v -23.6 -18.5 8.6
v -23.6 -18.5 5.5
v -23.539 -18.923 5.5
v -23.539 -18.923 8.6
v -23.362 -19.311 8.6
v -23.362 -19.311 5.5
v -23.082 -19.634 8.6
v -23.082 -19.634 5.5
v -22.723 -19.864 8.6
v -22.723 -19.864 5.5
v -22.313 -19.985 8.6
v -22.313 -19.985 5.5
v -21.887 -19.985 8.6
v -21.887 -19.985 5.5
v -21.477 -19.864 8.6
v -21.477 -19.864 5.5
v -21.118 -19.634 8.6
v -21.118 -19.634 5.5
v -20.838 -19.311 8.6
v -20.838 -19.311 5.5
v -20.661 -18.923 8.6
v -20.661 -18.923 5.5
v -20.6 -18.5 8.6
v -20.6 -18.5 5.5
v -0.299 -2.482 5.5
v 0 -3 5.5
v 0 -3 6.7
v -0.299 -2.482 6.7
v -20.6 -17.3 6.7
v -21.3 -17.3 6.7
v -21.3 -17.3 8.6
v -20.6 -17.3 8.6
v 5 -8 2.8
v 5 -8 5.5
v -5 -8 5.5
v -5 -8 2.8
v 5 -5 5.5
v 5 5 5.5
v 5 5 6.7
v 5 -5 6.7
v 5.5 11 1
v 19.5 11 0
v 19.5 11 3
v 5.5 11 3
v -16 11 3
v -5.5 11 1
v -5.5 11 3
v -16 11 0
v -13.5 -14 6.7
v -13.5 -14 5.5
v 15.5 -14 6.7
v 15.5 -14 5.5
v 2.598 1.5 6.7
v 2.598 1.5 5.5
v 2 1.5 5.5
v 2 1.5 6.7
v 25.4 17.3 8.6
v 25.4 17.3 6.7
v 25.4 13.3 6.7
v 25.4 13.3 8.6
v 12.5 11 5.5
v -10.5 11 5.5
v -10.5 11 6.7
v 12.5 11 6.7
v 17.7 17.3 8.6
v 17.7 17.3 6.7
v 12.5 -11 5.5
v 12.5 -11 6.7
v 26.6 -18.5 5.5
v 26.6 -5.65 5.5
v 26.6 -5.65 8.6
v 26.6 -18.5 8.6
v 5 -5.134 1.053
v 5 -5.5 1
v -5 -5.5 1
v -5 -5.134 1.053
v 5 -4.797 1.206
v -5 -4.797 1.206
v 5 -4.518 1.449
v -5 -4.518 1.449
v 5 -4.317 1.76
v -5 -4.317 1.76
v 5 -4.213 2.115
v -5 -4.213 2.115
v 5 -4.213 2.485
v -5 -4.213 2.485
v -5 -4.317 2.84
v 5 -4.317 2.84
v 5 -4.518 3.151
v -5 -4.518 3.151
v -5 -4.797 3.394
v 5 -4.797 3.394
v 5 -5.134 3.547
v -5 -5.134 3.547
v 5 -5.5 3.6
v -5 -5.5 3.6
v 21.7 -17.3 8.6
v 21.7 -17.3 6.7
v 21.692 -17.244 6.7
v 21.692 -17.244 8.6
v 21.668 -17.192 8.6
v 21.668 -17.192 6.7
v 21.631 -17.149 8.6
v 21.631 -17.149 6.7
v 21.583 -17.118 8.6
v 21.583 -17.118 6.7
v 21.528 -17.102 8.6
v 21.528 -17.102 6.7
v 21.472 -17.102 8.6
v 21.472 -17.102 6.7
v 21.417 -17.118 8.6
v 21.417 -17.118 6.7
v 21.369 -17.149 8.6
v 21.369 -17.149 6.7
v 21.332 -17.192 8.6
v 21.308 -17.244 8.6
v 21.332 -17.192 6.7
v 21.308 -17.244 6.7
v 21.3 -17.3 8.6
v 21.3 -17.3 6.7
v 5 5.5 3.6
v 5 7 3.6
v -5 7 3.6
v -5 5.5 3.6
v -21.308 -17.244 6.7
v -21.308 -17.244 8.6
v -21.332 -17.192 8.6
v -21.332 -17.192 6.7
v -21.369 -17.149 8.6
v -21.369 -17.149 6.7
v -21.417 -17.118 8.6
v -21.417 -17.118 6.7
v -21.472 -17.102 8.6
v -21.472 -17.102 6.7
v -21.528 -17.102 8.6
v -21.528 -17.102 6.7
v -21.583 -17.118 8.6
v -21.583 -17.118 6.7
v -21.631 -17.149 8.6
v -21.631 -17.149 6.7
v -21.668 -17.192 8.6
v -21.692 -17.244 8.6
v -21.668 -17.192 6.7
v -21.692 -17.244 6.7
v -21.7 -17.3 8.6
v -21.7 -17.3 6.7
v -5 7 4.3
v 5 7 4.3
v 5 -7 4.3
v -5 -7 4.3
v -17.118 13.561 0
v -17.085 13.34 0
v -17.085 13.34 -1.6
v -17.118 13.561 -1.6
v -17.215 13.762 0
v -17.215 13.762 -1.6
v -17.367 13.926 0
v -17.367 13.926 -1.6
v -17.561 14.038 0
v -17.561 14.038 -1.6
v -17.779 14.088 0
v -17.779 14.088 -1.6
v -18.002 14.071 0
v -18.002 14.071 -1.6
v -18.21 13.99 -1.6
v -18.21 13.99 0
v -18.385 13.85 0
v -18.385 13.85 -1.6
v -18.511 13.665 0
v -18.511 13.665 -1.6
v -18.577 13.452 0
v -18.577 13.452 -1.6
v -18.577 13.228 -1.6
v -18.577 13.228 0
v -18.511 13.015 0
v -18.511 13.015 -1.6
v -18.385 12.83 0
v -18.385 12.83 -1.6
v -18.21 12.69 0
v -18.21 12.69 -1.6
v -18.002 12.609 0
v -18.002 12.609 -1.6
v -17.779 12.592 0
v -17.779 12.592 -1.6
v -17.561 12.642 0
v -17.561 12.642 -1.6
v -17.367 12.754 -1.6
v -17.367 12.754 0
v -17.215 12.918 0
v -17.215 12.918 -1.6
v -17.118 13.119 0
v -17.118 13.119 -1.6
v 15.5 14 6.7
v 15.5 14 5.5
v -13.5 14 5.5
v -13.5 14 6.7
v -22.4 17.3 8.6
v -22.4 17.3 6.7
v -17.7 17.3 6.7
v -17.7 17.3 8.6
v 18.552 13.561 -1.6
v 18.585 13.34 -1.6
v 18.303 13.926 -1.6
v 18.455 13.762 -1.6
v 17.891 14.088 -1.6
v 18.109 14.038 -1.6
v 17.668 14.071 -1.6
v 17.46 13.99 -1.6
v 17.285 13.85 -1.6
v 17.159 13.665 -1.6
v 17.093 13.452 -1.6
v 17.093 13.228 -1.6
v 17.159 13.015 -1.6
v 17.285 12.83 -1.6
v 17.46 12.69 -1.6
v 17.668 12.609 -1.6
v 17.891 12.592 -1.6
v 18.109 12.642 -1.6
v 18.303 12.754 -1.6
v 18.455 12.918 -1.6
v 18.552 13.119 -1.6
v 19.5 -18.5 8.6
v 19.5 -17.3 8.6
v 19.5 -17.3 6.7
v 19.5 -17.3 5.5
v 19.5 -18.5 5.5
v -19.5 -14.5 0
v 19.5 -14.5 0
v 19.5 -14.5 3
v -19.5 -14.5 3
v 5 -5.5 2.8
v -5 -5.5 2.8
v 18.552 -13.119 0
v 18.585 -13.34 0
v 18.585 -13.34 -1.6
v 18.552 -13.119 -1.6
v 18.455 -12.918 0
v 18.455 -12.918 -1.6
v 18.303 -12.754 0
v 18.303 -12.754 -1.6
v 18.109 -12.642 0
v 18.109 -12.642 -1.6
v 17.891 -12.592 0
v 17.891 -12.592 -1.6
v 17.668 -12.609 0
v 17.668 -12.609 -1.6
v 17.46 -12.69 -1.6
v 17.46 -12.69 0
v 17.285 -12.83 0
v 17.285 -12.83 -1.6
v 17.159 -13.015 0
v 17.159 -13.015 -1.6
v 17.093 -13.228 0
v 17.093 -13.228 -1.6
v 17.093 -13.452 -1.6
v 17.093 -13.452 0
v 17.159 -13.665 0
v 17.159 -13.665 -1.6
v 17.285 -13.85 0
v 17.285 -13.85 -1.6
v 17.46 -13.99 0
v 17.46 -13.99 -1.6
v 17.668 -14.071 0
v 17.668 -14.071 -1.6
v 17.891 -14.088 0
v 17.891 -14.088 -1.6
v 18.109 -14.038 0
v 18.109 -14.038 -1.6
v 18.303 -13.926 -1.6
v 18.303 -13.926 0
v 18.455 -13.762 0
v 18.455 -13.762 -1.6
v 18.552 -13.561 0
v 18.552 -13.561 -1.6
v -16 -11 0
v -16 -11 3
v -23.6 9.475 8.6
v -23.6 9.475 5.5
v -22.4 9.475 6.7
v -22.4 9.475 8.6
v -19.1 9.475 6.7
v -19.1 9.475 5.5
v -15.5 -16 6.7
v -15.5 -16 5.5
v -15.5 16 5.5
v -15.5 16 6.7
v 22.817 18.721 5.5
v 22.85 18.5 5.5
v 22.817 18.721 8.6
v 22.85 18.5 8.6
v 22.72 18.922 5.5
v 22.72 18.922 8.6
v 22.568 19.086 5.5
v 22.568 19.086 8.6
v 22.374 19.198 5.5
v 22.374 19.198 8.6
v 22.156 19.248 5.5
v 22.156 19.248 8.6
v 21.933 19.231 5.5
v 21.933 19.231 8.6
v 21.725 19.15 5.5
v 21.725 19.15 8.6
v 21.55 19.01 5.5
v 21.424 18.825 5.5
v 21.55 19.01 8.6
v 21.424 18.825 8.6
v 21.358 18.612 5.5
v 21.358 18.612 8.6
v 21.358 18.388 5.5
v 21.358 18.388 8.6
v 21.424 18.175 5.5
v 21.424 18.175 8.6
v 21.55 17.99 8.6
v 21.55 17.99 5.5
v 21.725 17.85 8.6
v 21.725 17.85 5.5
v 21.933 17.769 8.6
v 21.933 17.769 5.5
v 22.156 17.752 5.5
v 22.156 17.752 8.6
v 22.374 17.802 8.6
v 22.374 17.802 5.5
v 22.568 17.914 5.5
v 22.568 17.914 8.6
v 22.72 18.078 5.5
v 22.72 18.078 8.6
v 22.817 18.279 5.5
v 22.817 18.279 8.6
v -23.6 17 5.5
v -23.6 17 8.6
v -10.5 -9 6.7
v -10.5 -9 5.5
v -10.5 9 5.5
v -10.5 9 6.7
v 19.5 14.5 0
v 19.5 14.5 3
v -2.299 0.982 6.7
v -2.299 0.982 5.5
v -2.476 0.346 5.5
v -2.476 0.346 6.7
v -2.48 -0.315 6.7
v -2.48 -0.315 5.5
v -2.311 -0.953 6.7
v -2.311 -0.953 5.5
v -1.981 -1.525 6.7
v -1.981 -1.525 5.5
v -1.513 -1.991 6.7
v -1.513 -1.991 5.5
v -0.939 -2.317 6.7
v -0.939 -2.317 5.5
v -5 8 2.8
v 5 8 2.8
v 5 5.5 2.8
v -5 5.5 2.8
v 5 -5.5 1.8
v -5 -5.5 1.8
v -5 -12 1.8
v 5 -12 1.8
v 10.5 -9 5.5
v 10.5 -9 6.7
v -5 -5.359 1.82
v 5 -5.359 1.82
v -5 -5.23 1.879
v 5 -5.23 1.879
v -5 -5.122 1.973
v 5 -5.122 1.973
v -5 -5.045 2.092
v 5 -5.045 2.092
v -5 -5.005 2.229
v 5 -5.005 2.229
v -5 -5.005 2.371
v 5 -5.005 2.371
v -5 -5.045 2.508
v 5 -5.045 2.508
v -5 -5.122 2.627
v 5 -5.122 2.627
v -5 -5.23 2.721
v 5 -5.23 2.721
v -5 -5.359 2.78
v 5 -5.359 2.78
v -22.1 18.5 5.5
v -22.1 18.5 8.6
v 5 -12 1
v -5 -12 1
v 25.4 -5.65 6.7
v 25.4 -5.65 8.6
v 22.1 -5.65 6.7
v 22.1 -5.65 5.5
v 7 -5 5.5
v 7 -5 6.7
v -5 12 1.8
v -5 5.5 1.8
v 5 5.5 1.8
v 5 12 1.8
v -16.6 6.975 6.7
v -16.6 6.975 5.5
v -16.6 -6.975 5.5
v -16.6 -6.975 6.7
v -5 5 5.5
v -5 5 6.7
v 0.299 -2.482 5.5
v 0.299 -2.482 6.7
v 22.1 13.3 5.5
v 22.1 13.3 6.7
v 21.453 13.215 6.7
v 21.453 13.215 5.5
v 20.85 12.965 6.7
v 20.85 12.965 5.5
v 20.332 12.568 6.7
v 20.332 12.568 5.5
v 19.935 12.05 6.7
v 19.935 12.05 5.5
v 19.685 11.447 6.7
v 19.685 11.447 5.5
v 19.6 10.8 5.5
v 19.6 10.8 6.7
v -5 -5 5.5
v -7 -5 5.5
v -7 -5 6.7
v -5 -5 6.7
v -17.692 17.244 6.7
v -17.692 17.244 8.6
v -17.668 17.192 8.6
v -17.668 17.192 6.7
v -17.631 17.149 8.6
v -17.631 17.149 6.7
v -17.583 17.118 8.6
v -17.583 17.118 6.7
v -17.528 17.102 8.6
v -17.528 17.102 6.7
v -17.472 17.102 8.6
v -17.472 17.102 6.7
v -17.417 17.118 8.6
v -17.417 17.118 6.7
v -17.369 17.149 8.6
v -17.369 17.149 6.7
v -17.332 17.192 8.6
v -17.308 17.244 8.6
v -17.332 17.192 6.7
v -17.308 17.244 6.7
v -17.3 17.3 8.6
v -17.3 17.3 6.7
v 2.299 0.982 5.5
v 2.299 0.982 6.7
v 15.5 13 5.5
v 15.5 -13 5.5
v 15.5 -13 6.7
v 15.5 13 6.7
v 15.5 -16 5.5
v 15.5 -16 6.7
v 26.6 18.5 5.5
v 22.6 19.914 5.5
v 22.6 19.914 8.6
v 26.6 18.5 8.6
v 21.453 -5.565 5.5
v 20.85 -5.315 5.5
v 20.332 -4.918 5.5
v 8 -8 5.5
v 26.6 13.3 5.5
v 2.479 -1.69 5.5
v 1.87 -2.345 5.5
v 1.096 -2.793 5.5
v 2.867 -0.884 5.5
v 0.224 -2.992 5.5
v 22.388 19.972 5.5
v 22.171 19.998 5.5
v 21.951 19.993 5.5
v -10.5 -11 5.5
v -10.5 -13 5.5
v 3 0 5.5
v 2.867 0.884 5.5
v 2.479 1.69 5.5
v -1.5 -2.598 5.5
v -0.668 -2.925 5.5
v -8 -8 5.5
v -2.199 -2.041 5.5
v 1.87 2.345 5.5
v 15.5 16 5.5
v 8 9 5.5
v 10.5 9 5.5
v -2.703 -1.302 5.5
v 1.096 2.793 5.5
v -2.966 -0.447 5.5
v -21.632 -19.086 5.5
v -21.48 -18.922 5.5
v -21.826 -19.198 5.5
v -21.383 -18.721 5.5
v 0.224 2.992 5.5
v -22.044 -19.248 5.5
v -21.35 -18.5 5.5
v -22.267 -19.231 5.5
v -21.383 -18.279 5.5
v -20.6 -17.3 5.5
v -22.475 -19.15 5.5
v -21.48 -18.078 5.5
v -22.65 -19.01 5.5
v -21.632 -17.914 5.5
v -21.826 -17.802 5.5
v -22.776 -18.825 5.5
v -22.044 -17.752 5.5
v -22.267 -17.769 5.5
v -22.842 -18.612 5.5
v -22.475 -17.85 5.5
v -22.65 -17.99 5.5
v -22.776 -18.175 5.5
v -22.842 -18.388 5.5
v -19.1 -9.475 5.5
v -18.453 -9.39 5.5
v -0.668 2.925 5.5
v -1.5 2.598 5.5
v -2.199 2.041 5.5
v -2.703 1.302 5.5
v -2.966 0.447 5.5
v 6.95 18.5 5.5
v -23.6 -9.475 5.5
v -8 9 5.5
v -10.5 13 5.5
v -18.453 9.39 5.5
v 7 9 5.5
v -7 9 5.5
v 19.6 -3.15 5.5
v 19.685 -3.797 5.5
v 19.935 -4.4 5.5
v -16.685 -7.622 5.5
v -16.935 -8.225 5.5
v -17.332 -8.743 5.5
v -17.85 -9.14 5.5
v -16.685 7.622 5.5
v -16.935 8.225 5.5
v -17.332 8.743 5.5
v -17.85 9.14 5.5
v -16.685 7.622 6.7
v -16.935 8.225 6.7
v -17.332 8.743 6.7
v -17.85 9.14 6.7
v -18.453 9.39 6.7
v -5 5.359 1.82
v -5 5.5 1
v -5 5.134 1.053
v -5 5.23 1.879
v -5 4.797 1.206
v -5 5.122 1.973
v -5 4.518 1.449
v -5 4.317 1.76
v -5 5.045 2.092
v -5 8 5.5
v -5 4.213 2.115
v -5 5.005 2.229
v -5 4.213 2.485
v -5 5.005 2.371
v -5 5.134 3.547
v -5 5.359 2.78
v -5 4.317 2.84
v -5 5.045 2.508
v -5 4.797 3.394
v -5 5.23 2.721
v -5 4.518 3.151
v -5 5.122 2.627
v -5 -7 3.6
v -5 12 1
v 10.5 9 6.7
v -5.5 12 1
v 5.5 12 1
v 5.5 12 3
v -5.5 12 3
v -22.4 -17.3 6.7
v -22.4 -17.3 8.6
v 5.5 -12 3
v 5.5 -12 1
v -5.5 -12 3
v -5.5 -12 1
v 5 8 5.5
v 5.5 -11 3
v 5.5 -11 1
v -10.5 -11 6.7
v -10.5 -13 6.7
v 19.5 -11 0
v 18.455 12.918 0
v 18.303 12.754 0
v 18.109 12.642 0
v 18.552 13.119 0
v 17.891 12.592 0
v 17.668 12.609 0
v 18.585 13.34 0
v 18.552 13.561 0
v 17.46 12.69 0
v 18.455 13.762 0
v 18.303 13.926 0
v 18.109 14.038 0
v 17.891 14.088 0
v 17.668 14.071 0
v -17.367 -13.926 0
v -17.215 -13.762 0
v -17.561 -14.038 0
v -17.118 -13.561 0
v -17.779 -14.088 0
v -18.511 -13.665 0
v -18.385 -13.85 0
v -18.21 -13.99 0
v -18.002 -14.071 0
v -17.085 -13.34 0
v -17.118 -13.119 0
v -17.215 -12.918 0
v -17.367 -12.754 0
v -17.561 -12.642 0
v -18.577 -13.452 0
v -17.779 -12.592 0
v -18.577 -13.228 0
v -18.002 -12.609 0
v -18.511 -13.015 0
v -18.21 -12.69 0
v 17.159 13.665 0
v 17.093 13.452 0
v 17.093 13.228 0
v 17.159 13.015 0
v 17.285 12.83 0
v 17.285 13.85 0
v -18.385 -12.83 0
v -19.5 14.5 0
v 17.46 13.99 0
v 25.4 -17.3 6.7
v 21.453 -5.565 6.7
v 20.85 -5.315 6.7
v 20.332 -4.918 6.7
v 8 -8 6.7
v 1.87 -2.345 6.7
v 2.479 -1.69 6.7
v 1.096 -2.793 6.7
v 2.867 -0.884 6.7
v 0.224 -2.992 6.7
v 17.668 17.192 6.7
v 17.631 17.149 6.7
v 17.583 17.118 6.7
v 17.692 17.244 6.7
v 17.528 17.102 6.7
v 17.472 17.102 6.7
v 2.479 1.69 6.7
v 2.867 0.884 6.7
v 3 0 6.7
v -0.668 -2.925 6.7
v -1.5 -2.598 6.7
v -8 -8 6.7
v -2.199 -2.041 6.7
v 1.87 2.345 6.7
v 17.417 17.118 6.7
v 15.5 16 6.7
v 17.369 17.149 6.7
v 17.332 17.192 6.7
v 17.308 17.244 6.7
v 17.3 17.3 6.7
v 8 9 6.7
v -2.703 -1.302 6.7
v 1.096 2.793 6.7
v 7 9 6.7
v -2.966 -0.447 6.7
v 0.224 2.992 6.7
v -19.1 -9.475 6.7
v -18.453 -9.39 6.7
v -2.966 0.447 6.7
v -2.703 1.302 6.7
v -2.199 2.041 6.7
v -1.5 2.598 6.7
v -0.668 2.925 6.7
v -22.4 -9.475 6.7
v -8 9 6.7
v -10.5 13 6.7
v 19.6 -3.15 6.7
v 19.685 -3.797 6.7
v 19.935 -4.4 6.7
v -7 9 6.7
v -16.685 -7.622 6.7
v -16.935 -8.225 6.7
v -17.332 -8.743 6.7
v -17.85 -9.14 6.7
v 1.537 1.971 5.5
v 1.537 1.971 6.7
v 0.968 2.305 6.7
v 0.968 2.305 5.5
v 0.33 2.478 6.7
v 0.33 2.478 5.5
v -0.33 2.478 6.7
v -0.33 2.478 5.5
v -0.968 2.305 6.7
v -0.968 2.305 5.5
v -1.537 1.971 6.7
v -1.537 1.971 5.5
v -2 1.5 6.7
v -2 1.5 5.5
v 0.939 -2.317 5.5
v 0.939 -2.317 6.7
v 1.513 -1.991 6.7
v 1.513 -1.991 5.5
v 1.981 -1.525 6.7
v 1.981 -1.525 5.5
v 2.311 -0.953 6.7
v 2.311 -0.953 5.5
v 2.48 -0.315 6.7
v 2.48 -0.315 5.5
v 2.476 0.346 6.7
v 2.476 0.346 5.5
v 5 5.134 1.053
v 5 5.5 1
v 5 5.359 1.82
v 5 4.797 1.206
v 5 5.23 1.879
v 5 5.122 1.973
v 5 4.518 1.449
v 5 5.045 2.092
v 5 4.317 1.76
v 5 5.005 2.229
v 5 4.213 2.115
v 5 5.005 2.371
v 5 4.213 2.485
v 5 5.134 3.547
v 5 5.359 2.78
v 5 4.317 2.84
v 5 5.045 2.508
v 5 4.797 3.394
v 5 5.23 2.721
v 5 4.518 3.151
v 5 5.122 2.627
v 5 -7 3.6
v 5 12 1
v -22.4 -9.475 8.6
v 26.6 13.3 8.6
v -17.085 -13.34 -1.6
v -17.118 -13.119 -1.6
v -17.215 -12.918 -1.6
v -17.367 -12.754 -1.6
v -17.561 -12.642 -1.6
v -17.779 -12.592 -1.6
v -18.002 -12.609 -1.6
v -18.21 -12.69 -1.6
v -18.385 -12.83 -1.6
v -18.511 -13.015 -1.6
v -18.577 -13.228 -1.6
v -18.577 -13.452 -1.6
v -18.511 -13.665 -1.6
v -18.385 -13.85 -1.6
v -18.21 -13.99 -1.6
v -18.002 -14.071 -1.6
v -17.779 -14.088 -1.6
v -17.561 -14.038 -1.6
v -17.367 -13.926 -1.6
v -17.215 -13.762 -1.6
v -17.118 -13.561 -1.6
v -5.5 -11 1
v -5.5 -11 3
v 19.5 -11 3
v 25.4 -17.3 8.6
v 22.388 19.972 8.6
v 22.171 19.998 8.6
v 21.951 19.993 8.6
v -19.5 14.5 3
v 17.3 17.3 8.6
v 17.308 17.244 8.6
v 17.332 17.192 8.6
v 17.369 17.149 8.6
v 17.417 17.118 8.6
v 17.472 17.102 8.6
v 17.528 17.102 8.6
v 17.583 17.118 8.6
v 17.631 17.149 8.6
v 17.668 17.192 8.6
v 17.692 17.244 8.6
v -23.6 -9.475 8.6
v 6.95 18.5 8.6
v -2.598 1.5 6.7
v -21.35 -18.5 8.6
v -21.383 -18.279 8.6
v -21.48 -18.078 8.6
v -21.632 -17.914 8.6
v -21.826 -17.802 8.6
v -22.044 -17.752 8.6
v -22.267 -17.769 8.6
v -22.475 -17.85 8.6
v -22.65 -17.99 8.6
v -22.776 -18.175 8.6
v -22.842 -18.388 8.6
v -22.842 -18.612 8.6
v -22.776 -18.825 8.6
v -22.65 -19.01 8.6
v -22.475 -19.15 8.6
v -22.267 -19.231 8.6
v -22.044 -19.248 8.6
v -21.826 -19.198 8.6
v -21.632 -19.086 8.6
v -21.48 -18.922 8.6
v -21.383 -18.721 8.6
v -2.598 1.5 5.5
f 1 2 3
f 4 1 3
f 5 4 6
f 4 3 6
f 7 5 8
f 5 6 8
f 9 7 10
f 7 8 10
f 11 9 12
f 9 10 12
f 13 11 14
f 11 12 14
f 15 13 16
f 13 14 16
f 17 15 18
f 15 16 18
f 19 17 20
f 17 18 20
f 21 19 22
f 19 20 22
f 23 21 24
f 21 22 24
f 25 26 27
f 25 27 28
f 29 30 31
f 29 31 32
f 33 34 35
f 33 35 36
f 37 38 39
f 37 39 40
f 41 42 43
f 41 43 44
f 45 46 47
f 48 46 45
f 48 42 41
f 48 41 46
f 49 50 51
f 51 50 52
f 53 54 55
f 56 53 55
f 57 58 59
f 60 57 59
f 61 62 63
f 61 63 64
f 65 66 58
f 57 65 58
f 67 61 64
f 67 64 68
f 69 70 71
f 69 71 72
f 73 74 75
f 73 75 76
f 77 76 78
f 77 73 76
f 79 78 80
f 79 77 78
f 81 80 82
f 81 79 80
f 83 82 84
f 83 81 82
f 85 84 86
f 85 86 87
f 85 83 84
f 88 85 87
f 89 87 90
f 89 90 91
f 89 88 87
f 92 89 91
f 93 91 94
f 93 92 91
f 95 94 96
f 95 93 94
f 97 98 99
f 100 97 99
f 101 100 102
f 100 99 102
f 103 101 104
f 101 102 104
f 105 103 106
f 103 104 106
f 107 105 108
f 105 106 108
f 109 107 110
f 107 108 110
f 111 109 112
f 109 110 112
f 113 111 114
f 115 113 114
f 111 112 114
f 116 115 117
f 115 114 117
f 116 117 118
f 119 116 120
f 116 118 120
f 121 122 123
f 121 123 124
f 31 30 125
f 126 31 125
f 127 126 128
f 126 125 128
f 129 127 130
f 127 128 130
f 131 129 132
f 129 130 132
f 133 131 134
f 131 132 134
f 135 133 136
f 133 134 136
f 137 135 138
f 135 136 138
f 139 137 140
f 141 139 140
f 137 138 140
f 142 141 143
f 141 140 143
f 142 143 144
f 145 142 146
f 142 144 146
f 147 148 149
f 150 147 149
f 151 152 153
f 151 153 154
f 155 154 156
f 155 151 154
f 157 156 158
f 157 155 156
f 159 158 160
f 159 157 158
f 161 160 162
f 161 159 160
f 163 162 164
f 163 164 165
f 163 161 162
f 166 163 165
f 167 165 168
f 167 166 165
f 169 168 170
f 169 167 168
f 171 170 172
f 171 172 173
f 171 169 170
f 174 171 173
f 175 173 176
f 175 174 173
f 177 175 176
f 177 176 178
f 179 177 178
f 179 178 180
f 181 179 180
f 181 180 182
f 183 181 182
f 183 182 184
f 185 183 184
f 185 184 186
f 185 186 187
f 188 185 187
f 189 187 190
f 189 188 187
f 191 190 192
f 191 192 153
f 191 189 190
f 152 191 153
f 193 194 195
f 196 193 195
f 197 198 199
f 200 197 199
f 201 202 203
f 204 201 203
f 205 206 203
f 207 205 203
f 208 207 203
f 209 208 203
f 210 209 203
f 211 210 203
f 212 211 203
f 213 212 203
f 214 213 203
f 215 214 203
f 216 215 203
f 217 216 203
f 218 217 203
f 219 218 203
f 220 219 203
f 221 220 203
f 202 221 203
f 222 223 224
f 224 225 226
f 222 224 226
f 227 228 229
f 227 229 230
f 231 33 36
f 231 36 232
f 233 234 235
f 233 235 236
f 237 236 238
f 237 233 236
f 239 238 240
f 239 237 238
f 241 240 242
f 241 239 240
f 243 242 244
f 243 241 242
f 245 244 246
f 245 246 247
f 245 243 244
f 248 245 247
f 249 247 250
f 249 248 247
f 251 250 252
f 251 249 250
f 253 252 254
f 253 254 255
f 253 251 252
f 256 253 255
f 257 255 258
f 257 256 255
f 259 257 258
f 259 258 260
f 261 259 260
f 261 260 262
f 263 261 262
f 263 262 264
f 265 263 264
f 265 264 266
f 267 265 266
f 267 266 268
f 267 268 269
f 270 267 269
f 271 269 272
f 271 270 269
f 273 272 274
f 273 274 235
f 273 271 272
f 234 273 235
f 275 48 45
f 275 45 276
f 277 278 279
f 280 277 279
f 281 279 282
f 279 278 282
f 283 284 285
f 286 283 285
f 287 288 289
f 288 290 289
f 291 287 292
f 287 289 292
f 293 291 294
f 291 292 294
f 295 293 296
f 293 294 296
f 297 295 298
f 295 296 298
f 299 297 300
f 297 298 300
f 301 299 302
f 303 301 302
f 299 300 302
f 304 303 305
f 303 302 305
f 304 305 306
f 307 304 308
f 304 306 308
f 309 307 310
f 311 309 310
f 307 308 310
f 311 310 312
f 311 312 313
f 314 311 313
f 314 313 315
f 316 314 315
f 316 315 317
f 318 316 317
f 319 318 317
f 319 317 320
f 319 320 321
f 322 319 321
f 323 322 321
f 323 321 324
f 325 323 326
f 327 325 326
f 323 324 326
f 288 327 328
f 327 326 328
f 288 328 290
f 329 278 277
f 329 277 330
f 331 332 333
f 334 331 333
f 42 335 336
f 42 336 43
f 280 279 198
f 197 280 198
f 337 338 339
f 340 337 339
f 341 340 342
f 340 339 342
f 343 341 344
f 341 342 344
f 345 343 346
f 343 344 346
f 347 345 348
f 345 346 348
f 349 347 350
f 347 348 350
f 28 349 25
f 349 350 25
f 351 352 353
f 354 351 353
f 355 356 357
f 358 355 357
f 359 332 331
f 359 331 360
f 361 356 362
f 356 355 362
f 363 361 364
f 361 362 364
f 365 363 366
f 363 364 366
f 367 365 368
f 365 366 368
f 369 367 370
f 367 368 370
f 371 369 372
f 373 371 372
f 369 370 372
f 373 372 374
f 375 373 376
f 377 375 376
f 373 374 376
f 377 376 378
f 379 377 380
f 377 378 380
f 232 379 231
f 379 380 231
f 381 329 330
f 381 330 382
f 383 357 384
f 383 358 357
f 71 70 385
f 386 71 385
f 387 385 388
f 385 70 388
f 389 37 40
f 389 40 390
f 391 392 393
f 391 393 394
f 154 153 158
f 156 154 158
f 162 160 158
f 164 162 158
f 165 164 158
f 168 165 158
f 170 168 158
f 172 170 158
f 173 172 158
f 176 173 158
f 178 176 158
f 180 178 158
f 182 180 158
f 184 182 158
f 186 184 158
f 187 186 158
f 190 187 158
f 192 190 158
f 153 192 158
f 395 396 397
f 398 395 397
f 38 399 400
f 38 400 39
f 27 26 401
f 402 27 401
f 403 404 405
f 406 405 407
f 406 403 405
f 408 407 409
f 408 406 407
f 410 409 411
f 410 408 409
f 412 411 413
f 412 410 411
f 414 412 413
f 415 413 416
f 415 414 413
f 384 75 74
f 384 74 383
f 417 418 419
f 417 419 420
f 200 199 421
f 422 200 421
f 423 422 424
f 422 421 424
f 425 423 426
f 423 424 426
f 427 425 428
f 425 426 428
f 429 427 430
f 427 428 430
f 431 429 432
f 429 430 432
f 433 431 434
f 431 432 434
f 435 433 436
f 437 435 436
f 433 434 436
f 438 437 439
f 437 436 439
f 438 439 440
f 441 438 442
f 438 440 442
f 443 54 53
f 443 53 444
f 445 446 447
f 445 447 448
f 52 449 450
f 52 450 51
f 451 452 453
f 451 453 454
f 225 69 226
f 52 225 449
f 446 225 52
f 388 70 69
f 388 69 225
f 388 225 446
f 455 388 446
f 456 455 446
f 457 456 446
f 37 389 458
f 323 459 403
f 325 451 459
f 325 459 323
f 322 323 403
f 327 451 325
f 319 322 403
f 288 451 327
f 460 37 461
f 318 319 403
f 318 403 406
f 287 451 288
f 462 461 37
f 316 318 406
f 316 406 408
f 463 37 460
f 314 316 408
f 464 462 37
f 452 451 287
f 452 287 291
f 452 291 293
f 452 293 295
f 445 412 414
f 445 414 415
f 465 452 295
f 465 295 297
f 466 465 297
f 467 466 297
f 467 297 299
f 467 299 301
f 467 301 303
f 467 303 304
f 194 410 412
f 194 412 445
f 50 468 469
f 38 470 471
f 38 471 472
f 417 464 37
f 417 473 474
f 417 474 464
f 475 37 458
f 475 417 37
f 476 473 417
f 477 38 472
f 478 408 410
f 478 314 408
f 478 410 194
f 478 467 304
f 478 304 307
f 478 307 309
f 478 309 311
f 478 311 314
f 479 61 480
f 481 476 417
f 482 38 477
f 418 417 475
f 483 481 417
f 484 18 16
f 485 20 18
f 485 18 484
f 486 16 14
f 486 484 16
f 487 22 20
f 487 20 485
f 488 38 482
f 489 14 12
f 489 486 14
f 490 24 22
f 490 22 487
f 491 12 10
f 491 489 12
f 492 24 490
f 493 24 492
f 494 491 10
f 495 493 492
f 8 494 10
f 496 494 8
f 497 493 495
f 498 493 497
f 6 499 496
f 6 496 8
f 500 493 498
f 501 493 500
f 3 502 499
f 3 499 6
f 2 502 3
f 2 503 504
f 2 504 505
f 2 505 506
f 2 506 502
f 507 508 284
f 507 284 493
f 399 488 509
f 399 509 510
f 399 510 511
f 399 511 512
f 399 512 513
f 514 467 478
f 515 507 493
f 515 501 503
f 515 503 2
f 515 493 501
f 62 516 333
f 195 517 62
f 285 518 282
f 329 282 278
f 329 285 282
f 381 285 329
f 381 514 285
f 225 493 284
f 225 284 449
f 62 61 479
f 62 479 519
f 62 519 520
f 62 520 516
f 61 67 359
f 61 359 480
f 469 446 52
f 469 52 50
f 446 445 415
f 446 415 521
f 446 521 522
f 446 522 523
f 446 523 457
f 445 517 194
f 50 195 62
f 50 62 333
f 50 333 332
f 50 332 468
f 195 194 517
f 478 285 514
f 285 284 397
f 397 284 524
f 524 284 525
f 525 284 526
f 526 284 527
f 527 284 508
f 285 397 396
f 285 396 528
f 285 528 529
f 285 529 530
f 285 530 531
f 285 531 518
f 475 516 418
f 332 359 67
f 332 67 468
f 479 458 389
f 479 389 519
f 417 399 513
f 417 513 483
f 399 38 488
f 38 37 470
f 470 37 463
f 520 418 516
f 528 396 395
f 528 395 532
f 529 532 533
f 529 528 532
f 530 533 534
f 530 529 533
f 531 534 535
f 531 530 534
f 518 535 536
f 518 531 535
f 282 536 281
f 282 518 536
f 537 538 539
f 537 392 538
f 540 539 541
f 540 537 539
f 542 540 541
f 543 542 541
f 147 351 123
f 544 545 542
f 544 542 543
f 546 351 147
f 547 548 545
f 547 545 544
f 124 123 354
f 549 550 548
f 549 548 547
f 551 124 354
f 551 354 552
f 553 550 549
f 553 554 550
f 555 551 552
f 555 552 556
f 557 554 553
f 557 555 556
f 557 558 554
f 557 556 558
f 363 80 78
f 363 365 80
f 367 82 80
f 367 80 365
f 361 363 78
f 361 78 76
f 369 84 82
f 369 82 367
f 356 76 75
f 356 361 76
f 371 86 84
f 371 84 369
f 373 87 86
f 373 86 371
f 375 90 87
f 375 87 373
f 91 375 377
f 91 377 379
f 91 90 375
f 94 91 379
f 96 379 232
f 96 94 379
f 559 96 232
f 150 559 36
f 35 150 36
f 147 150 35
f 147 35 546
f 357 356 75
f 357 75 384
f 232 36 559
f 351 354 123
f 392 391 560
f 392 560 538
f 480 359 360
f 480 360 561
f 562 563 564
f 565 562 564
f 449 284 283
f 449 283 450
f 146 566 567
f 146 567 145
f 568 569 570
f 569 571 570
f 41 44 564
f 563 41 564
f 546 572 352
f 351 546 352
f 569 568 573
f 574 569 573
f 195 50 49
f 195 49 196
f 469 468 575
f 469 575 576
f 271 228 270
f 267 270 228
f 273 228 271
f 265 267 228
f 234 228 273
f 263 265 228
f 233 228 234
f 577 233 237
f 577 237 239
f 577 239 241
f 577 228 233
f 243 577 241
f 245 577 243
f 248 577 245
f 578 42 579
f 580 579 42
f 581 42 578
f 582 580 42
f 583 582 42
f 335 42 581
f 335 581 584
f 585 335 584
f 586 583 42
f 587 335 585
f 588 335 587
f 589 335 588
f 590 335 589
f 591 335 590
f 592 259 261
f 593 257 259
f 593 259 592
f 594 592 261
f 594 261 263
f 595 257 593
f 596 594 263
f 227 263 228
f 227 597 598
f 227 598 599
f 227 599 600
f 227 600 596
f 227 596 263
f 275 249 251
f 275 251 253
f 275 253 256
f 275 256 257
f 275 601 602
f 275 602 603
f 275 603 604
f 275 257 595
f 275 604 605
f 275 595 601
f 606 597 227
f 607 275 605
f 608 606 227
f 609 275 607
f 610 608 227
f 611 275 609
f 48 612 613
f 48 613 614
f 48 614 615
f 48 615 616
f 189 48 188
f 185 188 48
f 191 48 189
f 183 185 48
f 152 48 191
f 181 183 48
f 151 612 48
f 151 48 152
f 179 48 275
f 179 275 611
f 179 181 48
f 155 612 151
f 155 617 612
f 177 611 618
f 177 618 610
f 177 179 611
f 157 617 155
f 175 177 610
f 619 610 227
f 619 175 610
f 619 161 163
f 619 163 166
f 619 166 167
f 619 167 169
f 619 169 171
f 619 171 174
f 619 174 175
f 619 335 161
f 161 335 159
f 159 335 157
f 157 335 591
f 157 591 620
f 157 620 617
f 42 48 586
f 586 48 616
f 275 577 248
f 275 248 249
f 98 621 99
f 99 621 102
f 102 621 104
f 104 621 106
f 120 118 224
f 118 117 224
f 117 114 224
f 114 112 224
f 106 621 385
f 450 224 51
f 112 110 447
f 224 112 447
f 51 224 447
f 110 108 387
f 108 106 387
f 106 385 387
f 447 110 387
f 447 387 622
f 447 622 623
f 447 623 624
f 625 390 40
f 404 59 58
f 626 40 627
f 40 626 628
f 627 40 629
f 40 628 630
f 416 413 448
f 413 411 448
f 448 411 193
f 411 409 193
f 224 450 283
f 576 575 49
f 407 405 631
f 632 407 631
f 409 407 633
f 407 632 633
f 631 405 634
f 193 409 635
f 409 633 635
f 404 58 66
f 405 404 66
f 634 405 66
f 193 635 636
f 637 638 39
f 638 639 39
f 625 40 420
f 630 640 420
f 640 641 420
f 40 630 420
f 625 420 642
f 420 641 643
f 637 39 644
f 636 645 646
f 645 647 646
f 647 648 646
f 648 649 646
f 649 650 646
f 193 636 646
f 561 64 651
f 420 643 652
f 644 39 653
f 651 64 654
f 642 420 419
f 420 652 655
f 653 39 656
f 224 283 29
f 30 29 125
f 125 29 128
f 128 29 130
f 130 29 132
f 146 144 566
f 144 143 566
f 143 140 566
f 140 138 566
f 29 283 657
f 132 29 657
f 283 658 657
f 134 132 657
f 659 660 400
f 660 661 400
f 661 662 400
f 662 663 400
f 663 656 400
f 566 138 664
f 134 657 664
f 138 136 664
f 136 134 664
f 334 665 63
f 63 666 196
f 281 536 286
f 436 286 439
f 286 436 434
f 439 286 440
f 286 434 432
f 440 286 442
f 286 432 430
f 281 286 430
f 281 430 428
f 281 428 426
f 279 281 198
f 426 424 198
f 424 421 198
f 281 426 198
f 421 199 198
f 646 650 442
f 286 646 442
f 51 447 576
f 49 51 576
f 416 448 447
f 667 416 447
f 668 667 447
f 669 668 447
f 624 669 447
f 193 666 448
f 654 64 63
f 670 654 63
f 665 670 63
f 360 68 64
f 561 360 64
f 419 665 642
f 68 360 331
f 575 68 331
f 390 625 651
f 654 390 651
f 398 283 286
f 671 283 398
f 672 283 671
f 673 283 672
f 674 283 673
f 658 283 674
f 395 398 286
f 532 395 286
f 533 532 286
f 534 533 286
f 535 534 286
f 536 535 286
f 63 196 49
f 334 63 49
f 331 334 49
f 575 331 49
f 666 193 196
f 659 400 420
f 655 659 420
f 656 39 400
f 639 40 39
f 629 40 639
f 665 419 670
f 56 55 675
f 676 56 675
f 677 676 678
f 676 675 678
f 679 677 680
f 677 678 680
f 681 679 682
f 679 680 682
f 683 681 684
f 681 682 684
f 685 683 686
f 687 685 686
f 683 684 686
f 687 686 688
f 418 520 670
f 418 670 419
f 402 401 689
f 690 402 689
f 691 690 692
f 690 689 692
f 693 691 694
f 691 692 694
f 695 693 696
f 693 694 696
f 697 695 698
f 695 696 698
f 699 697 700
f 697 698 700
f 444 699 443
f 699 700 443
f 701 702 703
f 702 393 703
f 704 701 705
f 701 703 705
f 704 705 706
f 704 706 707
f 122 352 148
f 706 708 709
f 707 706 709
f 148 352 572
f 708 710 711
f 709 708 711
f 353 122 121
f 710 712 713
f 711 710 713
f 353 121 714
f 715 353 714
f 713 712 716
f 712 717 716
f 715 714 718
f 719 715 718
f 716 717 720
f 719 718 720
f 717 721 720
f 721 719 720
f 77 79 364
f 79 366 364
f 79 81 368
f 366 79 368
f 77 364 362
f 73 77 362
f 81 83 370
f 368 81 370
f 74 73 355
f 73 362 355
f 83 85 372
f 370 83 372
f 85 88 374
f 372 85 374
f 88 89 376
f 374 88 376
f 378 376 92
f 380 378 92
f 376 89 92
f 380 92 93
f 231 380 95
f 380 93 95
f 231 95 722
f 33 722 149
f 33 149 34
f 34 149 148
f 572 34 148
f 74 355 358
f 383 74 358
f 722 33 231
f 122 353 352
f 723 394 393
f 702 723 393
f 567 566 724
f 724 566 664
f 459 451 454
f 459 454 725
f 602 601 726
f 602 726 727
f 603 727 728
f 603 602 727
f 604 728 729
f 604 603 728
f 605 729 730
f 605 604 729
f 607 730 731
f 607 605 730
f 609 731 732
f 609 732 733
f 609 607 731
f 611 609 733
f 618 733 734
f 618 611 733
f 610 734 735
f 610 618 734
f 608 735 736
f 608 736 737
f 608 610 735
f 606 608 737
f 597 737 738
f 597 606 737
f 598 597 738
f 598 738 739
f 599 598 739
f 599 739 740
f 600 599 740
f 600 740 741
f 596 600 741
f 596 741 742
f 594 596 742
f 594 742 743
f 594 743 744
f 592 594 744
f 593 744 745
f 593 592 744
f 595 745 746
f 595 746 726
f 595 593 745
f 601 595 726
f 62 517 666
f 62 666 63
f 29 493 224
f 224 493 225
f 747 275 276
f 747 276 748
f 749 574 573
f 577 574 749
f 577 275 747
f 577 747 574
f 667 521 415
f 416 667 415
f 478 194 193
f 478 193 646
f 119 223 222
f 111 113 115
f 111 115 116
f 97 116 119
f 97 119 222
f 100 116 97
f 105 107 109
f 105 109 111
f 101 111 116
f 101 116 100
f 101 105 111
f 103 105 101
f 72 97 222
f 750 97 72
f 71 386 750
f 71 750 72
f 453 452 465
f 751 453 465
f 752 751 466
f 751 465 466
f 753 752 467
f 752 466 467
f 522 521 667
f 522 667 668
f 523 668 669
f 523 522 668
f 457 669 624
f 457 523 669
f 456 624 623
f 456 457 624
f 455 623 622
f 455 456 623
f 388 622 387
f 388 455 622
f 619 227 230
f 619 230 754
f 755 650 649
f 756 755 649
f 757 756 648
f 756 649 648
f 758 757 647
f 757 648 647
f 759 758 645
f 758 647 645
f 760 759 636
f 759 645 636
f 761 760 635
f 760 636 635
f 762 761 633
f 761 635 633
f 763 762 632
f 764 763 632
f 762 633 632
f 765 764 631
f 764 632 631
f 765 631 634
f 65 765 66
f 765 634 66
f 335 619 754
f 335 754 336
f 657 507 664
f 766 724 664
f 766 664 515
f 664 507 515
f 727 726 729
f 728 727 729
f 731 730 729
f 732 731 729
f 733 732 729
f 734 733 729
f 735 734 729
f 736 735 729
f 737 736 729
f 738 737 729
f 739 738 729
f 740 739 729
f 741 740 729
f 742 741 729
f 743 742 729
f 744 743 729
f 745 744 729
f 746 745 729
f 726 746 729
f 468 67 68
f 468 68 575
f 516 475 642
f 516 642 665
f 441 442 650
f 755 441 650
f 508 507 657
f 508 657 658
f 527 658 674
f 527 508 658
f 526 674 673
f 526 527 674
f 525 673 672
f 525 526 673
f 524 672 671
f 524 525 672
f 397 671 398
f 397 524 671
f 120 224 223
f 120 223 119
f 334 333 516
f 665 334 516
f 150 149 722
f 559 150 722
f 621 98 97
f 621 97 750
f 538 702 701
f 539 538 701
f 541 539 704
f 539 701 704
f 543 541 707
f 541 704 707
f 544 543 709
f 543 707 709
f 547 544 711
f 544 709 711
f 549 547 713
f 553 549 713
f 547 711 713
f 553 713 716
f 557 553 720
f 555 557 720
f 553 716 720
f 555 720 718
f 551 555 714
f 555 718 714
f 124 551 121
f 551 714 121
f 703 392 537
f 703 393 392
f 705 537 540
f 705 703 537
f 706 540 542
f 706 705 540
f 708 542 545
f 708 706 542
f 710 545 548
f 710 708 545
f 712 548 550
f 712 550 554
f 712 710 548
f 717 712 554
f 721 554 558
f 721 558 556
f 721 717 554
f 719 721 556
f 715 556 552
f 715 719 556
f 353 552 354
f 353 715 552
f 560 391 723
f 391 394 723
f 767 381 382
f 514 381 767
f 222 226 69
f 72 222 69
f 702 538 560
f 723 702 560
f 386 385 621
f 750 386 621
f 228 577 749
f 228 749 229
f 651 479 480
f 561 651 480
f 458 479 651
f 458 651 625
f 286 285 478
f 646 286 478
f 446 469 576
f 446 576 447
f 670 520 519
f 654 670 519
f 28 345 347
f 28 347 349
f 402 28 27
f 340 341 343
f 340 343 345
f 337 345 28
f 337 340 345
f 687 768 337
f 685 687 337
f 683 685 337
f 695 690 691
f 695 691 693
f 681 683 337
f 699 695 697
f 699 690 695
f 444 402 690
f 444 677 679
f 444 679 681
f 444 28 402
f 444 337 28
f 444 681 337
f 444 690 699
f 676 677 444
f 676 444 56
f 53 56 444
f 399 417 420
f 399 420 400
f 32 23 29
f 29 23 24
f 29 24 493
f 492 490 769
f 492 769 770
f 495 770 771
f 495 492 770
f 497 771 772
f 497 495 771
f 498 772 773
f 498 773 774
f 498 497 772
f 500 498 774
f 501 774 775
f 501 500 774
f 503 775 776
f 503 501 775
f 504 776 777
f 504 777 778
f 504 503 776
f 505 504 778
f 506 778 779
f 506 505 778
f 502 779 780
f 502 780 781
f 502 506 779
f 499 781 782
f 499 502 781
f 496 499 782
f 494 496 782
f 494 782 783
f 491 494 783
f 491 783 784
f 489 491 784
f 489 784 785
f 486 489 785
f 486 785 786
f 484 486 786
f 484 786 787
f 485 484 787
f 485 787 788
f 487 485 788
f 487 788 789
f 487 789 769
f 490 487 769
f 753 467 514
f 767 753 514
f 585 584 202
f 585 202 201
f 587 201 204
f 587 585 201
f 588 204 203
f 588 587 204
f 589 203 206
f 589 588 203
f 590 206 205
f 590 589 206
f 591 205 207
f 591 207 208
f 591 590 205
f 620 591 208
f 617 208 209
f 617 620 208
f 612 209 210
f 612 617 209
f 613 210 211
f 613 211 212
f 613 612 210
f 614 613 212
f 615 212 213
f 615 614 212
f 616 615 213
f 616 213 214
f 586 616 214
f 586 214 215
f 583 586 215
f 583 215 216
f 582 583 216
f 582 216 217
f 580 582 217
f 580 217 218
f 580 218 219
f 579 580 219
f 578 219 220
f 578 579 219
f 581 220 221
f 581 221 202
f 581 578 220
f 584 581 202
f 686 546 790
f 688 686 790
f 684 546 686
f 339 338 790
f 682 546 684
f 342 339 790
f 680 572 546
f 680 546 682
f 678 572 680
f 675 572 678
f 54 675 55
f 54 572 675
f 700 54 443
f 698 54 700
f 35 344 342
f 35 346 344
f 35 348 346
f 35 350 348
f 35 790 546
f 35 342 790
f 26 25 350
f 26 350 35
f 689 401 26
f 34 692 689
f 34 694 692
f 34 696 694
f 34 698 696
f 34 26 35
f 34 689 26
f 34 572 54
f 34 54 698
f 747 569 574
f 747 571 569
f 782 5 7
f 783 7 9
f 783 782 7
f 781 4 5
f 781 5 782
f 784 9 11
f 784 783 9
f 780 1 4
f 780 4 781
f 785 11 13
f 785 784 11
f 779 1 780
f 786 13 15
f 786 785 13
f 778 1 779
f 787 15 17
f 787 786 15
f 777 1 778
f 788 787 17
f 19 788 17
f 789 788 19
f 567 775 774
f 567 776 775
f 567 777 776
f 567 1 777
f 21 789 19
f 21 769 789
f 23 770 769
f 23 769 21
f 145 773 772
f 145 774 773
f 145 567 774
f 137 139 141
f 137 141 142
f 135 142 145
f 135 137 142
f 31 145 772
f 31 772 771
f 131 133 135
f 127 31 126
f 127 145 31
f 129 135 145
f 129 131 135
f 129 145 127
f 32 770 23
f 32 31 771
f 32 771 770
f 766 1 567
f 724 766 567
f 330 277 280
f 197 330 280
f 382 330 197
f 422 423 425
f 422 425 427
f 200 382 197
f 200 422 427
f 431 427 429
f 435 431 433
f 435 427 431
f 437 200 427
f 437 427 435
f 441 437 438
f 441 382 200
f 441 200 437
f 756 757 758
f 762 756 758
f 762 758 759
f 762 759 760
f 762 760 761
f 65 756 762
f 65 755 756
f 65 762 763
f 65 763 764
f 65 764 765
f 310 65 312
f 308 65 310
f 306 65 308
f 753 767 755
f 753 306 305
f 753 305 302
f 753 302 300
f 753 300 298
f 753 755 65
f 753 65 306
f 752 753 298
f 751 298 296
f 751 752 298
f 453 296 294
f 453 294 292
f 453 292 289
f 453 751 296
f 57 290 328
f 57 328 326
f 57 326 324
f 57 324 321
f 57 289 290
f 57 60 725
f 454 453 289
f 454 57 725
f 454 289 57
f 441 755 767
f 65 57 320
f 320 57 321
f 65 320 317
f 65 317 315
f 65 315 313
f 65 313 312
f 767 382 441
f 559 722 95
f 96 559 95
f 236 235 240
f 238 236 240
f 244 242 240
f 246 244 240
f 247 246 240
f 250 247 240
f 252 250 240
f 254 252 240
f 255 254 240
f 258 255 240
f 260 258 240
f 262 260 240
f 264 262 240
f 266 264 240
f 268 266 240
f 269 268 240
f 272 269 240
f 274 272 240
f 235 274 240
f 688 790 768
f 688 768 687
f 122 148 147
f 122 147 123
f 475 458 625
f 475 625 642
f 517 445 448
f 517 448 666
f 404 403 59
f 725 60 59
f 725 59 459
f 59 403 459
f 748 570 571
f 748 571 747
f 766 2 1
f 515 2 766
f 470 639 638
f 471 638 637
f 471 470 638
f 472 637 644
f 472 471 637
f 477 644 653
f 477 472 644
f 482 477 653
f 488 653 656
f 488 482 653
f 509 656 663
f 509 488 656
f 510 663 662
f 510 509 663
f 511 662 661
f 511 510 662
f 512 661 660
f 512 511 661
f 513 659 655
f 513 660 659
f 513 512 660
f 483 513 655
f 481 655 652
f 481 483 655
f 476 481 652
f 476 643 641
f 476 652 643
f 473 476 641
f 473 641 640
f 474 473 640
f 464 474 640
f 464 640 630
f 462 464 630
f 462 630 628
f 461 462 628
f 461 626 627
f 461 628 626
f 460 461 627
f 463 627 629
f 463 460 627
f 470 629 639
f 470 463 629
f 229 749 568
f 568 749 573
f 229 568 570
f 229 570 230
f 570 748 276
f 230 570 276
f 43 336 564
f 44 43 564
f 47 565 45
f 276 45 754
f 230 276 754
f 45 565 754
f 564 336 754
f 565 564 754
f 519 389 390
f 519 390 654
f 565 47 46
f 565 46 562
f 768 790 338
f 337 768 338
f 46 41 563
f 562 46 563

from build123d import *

# Parameters (mm, degrees)
SKETCH007_W       = 47.8
SKETCH007_H       = 34.6
PAD005_DEPTH      = 1.2
SKETCH008_R       = 0.75
PAD006_DEPTH      = 3.1
POCKET001_DEPTH   = 3.101
SKETCH005_W       = 31
SKETCH005_H       = 32
POCKET002_DEPTH   = 5
SKETCH023_W       = 21
SKETCH023_H       = 18
PAD_DEPTH         = 1.2
PAD015_DEPTH      = 1.2
SKETCH013_R       = 0.75
POCKET_DEPTH      = 2.601
POCKET_DEPTH_BACK = -0.501
SKETCH034_R       = 3
POCKET006_DEPTH   = 5
PAD019_DEPTH      = 3
SKETCH_R          = 0.75
PAD020_DEPTH      = 1.6
SKETCH030_W       = 1
SKETCH030_H       = 2
POCKET003_DEPTH   = 5.5
PAD021_DEPTH      = 5
PAD022_DEPTH      = 1.2


with BuildPart() as plastic_tek1_display_interface_top_part:
    # Sketch007 (on DatumPlane) → Pad005 (new body)
    with BuildSketch(Plane.XY.offset(5.5)):
        with Locations((1.5, 0)):
            Rectangle(SKETCH007_W, SKETCH007_H)
    extrude(amount=PAD005_DEPTH)

    # Sketch008 (on DatumPlane) → Pad006 (join)
    with BuildSketch(Plane.XY.offset(5.5)):
        with BuildLine():
            Line((-22.4, -17.3), (-22.4, 17.3))
            Line((-22.4, 17.3), (-17.7, 17.3))
            ThreePointArc((-17.7, 17.3), (-17.5, 17.1), (-17.3, 17.3))
            Line((-17.3, 17.3), (17.3, 17.3))
            ThreePointArc((17.3, 17.3), (17.5, 17.1), (17.7, 17.3))
            Line((17.7, 17.3), (25.4, 17.3))
            Line((25.4, 17.3), (25.4, -17.3))
            Line((21.7, -17.3), (25.4, -17.3))
            ThreePointArc((21.7, -17.3), (21.5, -17.1), (21.3, -17.3))
            Line((19.5, -17.3), (21.3, -17.3))
            Line((19.5, -17.3), (19.5, -18.5))
            Line((19.5, -18.5), (26.6, -18.5))
            Line((26.6, 18.5), (26.6, -18.5))
            Line((22.6, 19.914214), (26.6, 18.5))
            ThreePointArc((22.6, 19.914214), (22.280063, 19.989153), (21.951485, 19.99263))
            Line((21.951485, 19.99263), (6.95, 18.5))
            Line((-22.1, 18.5), (6.95, 18.5))
            Line((-23.6, 17), (-22.1, 18.5))
            Line((-23.6, -18.5), (-23.6, 17))
            ThreePointArc((-23.6, -18.5), (-22.1, -20), (-20.6, -18.5))
            Line((-20.6, -18.5), (-20.6, -17.3))
            Line((-21.3, -17.3), (-20.6, -17.3))
            ThreePointArc((-21.3, -17.3), (-21.5, -17.1), (-21.7, -17.3))
            Line((-22.4, -17.3), (-21.7, -17.3))
        make_face()
        with Locations((-22.1, -18.5)):
            Circle(SKETCH008_R, mode=Mode.SUBTRACT)
    extrude(amount=PAD006_DEPTH)

    # Sketch009 (on DatumPlane) → Pocket001 (cut, through all)
    with BuildSketch(Plane.XY.offset(5.5)):
        with BuildLine():
            Line((19.6, -3.15), (19.6, 10.8))
            ThreePointArc((22.1, 13.3), (20.332233, 12.567767), (19.6, 10.8))
            Line((22.1, 13.3), (26.6, 13.3))
            Line((26.6, 13.3), (26.6, -5.65))
            Line((26.6, -5.65), (22.1, -5.65))
            ThreePointArc((19.6, -3.15), (20.332233, -4.917767), (22.1, -5.65))
        make_face()
        with BuildLine():
            Line((-23.6, 9.475), (-19.1, 9.475))
            ThreePointArc((-16.6, 6.975), (-17.332233, 8.742767), (-19.1, 9.475))
            Line((-16.6, 6.975), (-16.6, -6.975))
            ThreePointArc((-19.1, -9.475), (-17.332233, -8.742767), (-16.6, -6.975))
            Line((-19.1, -9.475), (-23.6, -9.475))
            Line((-23.6, -9.475), (-23.6, 9.475))
        make_face()
    extrude(amount=POCKET001_DEPTH, mode=Mode.SUBTRACT)

    # Sketch005 (on DatumPlane) → Pocket002 (cut)
    with BuildSketch(Plane.XY.offset(5.5)):
        Rectangle(SKETCH005_W, SKETCH005_H)
    extrude(amount=POCKET002_DEPTH, mode=Mode.SUBTRACT)

    # Sketch023 (on DatumPlane) → Pad (join)
    with BuildSketch(Plane.XY.offset(5.5)):
        Polygon((-13.5, -14), (-13.5, 14), (-10.5, 14), (15.5, 14), (15.5, 13), (-10.5, 13), (-10.5, 11), (12.5, 11), (12.5, -11), (-10.5, -11), (-10.5, -13), (15.5, -13), (15.5, -14), (-10.5, -14), align=None)
        Rectangle(SKETCH023_W, SKETCH023_H, mode=Mode.SUBTRACT)
    extrude(amount=PAD_DEPTH)

    # Sketch020 (on DatumPlane) → Pad015 (join)
    with BuildSketch(Plane.XY.offset(5.5)):
        Polygon((-5, -5), (-5, 5), (5, 5), (5, -5), (7, -5), (7, 10), (8, 10), (8, -8), (-8, -8), (-8, 10), (-7, 10), (-7, -5), align=None)
    extrude(amount=PAD015_DEPTH)

    # Sketch013 (on DatumPlane) → Pocket (cut, two sides)
    with BuildSketch(Plane.XY.offset(8.1)) as pocket_sk:
        with Locations((22.1, 18.5)):
            Circle(SKETCH013_R)
        with Locations((-22.1, -18.5)):
            Circle(SKETCH013_R)
    extrude(amount=-POCKET_DEPTH, mode=Mode.SUBTRACT)
    extrude(pocket_sk.sketch, amount=-POCKET_DEPTH_BACK, mode=Mode.SUBTRACT)

    # Sketch034 (on DatumPlane) → Pocket006 (cut)
    with BuildSketch(Plane.XY.offset(5.5)):
        Circle(SKETCH034_R)
    extrude(amount=POCKET006_DEPTH, mode=Mode.SUBTRACT)


with BuildPart() as body002:
    # Sketch029 → Pad019 (new body)
    with BuildSketch(Plane.XY):
        Polygon((-19.5, -14.5), (-19.5, 14.5), (19.5, 14.5), (19.5, 11), (-16, 11), (-16, -11), (19.5, -11), (19.5, -14.5), align=None)
    extrude(amount=PAD019_DEPTH)

    # Sketch → Pad020 (join)
    with BuildSketch(Plane.XY):
        with Locations((-17.835, 13.34)):
            Circle(SKETCH_R)
        with Locations((-17.835, -13.34)):
            Circle(SKETCH_R)
        with Locations((17.835, -13.34)):
            Circle(SKETCH_R)
        with Locations((17.835, 13.34)):
            Circle(SKETCH_R)
    extrude(amount=-PAD020_DEPTH)

    # Sketch030 → Pocket003 (cut, symmetric)
    with BuildSketch(Plane.YZ):
        with Locations((-11.5, 2)):
            Rectangle(SKETCH030_W, SKETCH030_H)
        with Locations((11.5, 2)):
            Rectangle(SKETCH030_W, SKETCH030_H)
    extrude(amount=POCKET003_DEPTH, both=True, mode=Mode.SUBTRACT)


with BuildPart() as body003:
    # Sketch032 → Pad021 (new body, symmetric)
    with BuildSketch(Plane.YZ):
        with BuildLine():
            Line((-12, 1.8), (-12, 1))
            Line((-5.5, 1), (-12, 1))
            ThreePointArc((-5.5, 1), (-4.2, 2.3), (-5.5, 3.6))
            Line((-7, 3.6), (-5.5, 3.6))
            Line((-7, 4.3), (-7, 3.6))
            Line((-7, 4.3), (0, 4.3))
            Line((0, 5.5), (0, 4.3))
            Line((-8, 5.5), (0, 5.5))
            Line((-8, 5.5), (-8, 2.8))
            Line((-8, 2.8), (-5.5, 2.8))
            ThreePointArc((-5.5, 1.8), (-5, 2.3), (-5.5, 2.8))
            Line((-5.5, 1.8), (-12, 1.8))
        make_face()
    pad021 = extrude(amount=PAD021_DEPTH, both=True)

    # Mirrored004: Pad021 across Sketch027 V_Axis
    add(pad021.mirror(Plane(origin=(0, 0, 0), x_dir=(1, 0, 0), z_dir=(0, 1, 0))))

    # Sketch026 (on DatumPlane) → Pad022 (join)
    with BuildSketch(Plane.XY.offset(5.5)):
        with BuildLine():
            ThreePointArc((-2.299038, 0.982051), (-2.165064, -1.25), (-0.299038, -2.482051))
            Line((0, -3), (-0.299038, -2.482051))
            Line((0, -3), (0.299038, -2.482051))
            ThreePointArc((0.299038, -2.482051), (2.165064, -1.25), (2.299038, 0.982051))
            Line((2.598076, 1.5), (2.299038, 0.982051))
            Line((2.598076, 1.5), (2, 1.5))
            ThreePointArc((2, 1.5), (0, 2.5), (-2, 1.5))
            Line((-2.598076, 1.5), (-2, 1.5))
            Line((-2.598076, 1.5), (-2.299038, 0.982051))
        make_face()
    extrude(amount=PAD022_DEPTH)


solid = Compound([plastic_tek1_display_interface_top_part.part, body002.part, body003.part])
